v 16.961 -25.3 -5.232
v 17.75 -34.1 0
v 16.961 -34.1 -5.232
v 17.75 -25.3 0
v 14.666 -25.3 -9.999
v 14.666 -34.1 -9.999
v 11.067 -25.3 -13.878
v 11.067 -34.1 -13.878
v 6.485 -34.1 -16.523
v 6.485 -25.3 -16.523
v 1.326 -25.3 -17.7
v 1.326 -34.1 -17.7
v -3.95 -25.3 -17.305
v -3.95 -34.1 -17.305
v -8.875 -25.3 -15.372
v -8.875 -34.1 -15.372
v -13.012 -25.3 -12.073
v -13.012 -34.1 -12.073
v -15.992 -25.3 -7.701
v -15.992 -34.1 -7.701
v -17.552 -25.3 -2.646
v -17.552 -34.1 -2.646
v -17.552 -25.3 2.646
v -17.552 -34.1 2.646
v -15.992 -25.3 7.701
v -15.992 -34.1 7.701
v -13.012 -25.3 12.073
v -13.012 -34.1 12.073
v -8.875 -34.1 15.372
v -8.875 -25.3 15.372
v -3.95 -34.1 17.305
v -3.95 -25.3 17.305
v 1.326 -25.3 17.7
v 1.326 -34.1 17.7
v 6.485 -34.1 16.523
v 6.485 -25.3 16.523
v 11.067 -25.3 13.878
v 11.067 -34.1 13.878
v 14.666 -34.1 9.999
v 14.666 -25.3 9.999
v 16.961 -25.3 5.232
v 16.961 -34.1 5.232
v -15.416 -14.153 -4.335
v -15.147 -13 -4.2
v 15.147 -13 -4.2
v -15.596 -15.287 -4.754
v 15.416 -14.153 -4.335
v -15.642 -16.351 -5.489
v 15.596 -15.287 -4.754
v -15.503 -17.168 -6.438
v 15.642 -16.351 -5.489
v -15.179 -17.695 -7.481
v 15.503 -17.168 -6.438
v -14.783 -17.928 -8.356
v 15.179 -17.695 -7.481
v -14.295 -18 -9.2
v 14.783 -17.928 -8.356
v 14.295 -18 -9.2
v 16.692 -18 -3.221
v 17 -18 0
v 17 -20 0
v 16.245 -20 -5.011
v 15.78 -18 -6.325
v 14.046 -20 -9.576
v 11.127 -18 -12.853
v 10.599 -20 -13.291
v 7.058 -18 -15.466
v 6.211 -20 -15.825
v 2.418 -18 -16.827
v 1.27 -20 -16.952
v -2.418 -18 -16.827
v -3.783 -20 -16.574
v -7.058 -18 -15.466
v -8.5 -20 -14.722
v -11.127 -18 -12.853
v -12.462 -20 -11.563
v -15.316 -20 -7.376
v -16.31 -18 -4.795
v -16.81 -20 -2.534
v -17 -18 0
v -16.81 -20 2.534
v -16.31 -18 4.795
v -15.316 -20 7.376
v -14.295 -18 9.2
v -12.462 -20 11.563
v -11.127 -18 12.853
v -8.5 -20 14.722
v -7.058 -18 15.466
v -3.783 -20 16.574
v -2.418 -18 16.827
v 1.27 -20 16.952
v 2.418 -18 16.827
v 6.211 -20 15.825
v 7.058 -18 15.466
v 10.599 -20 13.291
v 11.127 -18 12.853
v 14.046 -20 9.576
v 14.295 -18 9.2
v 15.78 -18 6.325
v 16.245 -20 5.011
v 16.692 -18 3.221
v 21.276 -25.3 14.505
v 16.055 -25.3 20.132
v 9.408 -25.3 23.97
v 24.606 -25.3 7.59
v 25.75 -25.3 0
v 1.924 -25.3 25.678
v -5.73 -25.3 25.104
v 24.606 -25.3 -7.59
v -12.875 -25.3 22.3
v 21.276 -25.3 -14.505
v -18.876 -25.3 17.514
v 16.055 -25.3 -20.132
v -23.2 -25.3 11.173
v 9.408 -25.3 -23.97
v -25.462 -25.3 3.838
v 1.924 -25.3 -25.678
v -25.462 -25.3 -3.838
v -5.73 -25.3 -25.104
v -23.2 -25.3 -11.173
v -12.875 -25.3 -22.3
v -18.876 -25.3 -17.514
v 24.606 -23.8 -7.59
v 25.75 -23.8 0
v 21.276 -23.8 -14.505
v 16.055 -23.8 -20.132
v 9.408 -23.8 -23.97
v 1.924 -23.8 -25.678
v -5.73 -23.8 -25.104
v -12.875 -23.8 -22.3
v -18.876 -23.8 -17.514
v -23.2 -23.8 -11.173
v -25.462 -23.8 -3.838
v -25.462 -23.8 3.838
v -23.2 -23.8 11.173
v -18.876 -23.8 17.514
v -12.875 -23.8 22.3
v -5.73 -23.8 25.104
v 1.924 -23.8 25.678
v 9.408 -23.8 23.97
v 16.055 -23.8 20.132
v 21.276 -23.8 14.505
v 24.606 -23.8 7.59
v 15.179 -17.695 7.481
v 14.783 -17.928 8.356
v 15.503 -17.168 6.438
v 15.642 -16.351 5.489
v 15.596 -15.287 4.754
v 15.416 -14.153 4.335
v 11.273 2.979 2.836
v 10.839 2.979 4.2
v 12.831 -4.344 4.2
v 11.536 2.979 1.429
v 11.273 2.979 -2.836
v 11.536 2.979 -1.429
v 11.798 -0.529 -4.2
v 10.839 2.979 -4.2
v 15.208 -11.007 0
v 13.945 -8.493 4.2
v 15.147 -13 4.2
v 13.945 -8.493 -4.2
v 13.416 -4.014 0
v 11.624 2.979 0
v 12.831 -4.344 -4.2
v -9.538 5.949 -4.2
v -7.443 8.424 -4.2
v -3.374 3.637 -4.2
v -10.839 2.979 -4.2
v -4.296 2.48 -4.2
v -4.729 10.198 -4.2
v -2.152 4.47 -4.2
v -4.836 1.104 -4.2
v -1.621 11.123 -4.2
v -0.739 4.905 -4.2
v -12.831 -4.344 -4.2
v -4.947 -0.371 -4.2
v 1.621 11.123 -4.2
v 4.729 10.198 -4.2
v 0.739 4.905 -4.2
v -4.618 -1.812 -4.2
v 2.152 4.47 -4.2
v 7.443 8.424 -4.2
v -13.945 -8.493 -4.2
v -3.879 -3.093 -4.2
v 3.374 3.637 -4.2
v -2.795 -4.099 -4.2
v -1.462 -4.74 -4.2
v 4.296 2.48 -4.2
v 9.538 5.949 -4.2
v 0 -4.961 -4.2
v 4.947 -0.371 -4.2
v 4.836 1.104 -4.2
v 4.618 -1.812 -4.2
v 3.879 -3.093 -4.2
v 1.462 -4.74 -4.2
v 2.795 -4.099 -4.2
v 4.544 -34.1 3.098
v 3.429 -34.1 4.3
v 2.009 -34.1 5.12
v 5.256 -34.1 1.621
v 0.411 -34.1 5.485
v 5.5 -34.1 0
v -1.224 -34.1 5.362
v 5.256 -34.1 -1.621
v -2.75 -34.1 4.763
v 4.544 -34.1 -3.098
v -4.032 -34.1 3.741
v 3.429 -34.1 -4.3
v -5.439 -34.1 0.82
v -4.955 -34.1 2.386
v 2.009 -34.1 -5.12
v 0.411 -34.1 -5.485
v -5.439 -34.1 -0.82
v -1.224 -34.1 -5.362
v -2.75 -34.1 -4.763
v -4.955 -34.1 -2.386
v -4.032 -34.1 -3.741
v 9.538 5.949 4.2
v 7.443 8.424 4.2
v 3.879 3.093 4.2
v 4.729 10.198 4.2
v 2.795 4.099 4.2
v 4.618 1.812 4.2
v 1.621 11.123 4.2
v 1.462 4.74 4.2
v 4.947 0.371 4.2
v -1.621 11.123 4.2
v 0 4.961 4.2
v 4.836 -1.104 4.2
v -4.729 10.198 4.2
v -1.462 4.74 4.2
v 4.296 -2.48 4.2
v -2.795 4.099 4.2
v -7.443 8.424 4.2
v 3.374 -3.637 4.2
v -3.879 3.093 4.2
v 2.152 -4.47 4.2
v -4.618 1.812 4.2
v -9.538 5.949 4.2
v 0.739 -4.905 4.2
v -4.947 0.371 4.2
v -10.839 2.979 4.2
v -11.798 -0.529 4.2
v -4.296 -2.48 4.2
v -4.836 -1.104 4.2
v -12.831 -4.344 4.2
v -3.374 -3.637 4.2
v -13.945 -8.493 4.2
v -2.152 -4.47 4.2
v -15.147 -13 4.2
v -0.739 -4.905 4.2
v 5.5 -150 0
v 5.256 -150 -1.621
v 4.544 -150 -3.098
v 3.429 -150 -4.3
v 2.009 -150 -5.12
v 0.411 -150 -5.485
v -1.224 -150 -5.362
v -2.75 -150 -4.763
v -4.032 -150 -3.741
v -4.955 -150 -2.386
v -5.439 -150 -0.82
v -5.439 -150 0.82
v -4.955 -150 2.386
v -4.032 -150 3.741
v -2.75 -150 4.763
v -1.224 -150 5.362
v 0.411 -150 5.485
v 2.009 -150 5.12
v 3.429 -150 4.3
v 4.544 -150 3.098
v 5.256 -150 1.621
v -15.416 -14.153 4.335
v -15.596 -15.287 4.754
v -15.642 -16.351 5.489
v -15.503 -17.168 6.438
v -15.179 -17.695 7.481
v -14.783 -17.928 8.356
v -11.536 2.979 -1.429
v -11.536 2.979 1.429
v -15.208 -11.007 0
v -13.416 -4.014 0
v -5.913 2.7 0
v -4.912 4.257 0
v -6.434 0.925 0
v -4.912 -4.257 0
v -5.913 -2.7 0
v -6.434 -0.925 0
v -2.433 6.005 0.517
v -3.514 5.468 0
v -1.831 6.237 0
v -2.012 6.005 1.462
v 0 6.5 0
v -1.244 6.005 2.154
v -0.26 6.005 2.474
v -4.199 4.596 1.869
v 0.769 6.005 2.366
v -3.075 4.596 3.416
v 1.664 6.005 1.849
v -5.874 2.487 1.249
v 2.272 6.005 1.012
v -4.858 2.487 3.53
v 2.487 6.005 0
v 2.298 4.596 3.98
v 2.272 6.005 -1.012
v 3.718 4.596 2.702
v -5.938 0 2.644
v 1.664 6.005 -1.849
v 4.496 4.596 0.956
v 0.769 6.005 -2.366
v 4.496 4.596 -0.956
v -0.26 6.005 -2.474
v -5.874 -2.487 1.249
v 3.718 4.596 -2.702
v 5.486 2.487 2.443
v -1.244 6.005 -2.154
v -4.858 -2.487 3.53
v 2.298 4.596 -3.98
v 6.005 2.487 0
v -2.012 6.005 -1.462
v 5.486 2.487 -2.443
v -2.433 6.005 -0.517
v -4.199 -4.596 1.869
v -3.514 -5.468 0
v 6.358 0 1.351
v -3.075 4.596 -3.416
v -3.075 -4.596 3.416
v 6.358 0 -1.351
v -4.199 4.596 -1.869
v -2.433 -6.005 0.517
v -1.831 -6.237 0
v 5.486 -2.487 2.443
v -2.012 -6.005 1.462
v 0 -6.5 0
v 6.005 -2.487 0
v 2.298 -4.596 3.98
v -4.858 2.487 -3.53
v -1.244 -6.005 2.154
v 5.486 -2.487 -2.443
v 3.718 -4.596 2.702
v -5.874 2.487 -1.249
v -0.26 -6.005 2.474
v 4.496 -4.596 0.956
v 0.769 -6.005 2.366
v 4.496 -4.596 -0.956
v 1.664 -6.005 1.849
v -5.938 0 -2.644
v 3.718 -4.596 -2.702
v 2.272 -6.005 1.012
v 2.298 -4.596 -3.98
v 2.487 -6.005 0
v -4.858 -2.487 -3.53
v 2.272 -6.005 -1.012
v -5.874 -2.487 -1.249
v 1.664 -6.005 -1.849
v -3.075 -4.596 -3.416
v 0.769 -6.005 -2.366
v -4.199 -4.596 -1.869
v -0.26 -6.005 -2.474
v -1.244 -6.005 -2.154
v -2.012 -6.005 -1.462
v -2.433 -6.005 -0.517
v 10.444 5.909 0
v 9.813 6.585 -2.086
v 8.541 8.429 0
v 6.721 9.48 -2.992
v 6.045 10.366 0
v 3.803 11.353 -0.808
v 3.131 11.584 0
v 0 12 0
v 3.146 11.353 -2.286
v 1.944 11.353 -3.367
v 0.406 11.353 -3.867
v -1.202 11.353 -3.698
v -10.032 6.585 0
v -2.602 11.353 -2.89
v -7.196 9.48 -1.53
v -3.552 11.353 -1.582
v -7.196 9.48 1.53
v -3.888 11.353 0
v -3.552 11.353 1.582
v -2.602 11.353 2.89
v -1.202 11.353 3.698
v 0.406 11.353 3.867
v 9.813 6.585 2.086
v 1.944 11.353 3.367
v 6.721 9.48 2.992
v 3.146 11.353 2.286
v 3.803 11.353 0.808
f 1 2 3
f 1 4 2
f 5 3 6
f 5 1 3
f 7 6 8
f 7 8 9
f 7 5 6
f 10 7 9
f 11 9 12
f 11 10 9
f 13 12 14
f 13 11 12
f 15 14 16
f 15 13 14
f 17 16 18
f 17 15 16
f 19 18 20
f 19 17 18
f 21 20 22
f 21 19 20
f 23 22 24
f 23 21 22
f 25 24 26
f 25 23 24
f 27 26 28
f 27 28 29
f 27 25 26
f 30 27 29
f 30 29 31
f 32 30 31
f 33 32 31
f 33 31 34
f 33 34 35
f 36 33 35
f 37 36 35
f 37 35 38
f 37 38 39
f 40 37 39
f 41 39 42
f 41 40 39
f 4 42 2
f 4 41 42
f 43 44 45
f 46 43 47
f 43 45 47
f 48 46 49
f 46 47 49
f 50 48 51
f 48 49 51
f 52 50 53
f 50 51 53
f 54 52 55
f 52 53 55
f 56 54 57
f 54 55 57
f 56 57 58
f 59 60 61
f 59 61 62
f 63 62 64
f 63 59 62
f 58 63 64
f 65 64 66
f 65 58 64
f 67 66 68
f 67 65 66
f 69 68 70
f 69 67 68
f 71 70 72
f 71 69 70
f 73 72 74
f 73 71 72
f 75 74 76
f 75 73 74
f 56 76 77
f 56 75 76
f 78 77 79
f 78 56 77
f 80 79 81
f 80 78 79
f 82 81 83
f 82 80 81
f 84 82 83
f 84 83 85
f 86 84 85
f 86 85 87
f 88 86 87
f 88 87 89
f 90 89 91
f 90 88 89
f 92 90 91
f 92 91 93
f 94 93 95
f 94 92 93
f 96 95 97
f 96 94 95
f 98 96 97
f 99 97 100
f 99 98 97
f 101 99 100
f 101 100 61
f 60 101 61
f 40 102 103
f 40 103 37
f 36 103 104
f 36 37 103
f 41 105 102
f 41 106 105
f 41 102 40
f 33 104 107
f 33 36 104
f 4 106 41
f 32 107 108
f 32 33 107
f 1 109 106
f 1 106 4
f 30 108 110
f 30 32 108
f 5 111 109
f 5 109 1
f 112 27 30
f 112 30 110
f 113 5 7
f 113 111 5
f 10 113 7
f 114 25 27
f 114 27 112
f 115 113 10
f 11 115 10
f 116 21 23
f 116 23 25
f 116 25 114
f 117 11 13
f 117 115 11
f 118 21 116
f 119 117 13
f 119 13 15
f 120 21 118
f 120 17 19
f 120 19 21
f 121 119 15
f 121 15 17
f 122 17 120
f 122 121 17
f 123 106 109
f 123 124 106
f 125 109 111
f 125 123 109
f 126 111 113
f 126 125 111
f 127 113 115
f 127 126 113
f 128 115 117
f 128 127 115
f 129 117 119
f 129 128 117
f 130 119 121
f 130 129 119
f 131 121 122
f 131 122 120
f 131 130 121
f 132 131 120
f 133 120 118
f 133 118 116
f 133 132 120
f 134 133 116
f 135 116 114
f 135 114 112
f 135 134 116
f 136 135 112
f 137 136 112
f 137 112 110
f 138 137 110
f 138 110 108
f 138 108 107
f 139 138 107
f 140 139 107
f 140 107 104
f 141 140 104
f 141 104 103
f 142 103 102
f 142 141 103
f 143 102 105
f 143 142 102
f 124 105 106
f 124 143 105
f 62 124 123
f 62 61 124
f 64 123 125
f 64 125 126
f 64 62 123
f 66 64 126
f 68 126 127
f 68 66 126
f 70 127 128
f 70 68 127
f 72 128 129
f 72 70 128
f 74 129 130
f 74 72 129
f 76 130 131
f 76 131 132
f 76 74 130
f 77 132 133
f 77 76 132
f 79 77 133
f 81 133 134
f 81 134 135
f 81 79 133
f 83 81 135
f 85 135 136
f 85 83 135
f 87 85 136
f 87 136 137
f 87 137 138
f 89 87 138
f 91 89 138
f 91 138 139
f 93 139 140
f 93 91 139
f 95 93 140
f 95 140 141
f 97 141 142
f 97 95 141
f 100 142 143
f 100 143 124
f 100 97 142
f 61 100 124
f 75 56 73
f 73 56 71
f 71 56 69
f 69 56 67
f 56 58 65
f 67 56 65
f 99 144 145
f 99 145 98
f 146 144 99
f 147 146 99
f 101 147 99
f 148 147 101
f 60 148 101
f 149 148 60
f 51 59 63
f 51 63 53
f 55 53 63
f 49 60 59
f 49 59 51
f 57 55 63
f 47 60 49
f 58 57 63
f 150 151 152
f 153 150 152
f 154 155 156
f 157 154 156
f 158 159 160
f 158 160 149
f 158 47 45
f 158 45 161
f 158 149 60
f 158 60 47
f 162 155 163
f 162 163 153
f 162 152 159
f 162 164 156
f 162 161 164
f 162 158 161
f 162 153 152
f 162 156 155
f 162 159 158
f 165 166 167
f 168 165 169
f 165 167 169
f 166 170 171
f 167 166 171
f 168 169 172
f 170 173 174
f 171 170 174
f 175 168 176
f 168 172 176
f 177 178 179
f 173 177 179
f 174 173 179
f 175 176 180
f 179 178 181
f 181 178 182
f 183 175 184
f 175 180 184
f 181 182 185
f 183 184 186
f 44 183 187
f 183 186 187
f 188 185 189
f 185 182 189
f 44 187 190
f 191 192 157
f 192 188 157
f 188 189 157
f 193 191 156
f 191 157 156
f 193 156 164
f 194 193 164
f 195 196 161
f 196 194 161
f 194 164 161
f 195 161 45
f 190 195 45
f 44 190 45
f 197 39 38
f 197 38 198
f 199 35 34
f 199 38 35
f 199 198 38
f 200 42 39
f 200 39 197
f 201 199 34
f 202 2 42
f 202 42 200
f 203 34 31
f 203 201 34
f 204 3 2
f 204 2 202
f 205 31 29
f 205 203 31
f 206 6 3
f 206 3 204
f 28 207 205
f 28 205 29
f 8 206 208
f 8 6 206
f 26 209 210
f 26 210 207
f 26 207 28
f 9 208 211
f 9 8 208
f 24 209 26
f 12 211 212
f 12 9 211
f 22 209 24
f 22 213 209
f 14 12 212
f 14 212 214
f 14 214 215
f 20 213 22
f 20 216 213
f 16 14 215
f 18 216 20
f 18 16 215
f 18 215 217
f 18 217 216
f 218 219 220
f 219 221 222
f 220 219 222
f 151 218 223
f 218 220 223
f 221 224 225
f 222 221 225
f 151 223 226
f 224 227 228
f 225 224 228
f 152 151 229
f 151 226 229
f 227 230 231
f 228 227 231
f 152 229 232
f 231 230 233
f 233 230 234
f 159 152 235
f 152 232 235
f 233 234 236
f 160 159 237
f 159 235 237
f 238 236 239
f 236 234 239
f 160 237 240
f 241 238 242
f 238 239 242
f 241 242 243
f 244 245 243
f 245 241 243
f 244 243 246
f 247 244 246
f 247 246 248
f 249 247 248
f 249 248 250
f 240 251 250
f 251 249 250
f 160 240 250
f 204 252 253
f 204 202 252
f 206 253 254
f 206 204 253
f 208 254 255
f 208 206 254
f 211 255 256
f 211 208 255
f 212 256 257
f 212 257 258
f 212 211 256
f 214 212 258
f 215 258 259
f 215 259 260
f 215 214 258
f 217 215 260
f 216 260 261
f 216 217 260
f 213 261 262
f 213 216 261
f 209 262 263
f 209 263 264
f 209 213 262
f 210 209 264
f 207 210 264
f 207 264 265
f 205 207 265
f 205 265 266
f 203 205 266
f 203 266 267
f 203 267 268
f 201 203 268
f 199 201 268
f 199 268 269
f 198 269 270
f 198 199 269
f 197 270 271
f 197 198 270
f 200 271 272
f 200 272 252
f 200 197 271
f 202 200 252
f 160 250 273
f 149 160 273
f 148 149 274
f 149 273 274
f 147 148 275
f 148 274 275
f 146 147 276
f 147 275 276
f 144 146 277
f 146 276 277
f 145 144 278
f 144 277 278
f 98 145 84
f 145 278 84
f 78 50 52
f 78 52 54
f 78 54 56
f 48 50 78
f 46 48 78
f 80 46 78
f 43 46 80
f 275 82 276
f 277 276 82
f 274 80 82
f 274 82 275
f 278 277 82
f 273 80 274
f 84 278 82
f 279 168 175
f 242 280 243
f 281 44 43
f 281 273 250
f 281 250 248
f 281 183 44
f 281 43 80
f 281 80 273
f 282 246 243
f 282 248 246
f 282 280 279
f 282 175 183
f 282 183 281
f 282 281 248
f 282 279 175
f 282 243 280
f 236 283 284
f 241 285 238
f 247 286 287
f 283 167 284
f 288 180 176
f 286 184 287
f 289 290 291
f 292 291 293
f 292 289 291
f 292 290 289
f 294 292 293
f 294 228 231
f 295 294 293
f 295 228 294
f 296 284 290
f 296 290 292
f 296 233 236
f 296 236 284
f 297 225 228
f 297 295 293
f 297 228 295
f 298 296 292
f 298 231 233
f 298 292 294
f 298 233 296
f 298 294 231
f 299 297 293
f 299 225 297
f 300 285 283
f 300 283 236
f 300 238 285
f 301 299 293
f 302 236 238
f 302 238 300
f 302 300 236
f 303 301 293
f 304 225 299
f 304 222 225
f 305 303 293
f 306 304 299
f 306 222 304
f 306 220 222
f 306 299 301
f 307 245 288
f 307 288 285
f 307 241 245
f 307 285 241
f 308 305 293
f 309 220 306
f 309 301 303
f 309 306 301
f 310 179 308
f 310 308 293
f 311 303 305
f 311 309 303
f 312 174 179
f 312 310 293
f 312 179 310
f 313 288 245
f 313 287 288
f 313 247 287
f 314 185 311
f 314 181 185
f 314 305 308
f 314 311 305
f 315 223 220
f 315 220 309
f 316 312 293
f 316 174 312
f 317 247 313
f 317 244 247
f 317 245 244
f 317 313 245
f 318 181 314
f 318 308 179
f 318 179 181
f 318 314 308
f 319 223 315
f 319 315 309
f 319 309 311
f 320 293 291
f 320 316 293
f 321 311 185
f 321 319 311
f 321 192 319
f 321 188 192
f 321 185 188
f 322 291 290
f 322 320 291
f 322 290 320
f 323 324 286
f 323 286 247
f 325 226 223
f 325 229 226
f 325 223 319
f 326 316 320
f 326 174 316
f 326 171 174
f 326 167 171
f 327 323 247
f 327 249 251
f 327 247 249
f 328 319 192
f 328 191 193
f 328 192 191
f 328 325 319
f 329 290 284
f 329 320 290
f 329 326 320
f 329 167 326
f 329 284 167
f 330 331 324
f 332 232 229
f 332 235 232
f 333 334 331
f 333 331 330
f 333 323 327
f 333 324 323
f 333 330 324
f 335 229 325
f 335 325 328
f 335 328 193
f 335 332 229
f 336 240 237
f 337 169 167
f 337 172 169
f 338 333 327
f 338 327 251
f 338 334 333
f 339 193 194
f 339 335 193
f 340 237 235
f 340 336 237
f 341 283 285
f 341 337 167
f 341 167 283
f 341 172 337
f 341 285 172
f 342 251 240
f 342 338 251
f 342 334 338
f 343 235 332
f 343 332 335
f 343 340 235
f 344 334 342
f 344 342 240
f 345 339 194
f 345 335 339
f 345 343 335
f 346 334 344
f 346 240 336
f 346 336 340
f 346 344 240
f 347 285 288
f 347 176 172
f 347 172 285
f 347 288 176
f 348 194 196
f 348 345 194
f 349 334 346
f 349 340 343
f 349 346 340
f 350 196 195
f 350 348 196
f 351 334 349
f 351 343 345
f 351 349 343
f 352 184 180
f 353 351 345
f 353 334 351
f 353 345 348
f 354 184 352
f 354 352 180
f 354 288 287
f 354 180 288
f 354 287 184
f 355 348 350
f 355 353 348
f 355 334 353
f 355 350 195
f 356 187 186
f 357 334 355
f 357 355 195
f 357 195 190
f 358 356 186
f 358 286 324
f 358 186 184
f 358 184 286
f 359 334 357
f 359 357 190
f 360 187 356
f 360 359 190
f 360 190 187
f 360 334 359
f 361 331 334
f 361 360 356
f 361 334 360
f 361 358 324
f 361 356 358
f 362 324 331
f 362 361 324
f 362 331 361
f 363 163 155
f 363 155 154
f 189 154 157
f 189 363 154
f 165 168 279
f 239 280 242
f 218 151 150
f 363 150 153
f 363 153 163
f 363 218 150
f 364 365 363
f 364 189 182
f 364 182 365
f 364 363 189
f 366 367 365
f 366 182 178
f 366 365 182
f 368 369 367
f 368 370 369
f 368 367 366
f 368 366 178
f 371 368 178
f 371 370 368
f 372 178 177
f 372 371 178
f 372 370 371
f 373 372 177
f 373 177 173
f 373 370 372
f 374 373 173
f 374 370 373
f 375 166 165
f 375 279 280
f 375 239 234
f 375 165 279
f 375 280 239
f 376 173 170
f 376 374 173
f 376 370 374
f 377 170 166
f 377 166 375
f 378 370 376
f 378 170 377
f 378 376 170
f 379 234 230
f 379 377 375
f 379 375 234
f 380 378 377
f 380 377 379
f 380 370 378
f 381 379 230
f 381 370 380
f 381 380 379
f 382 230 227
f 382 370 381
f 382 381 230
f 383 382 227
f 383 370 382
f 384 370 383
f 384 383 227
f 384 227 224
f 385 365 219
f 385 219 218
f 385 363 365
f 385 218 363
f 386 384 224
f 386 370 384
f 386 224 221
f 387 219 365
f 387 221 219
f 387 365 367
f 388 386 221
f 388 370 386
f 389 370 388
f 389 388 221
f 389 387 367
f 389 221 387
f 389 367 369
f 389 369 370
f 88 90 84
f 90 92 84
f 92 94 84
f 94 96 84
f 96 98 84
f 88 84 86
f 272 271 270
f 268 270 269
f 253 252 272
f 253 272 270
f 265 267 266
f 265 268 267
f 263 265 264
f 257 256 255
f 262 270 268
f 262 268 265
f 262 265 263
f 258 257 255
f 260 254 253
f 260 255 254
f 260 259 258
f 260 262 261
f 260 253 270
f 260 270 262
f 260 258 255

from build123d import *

# Parameters (mm, degrees)
CUT_EXTRUDE1_DEPTH = 25


with BuildPart() as part:
    # Sketch1 → Revolve1 (revolve)
    with BuildSketch(Plane.XY, mode=Mode.PRIVATE) as revolve1_sk:
        with BuildLine():
            Line((0, -150), (-5.5, -150))
            Line((-5.5, -150), (-5.5, -34.1))
            Line((-5.5, -34.1), (-17.75, -34.1))
            Line((-17.75, -34.1), (-17.75, -25.3))
            Line((-17.75, -25.3), (-25.75, -25.3))
            Line((-25.75, -25.3), (-25.75, -23.8))
            Line((-25.75, -23.8), (-17, -20))
            Line((-17, -20), (-17, -18))
            Line((-17, -18), (-11.624443868, 2.97864143))
            ThreePointArc((-11.624443868, 2.97864143), (-7.357183661, 9.480076402), (0, 12))
            Line((0, 12), (0, -150))
        make_face()
    revolve(revolve1_sk.sketch.rotate(Axis((0, -150, 0), (0, 1, 0)), 180), axis=Axis((0, -150, 0), (0, 1, 0)))

    # Sketch2 → Cut-Extrude1 (cut, symmetric)
    with BuildSketch(Plane(origin=(0, 0, 0), x_dir=(0, 0, -1), z_dir=(1, 0, 0))):
        with BuildLine():
            Line((-4.2, 12.434179723), (-4.2, -13))
            ThreePointArc((-4.2, -13), (-5.664466094, -16.535533906), (-9.2, -18))
            Line((-9.2, -18), (-21.107877624, -18))
            Line((-21.107877624, -18), (-21.107877624, 12.434179723))
            Line((-21.107877624, 12.434179723), (-4.2, 12.434179723))
        make_face()
        with BuildLine():
            Line((21.107877624, 12.434179723), (4.2, 12.434179723))
            Line((4.2, 12.434179723), (4.2, -13))
            ThreePointArc((4.2, -13), (5.664466094, -16.535533906), (9.2, -18))
            Line((9.2, -18), (21.107877624, -18))
            Line((21.107877624, -18), (21.107877624, 12.434179723))
        make_face()
    extrude(amount=CUT_EXTRUDE1_DEPTH, both=True, mode=Mode.SUBTRACT)

    # Sketch3 → Cut-Revolve1 (revolve, cut)
    with BuildSketch(Plane.XY):
        with BuildLine():
            Line((0, -6.5), (0, 6.5))
            ThreePointArc((0, 6.5), (-6.5, 0), (0, -6.5))
        make_face()
    revolve(axis=Axis((0, -6.5, 0), (0, 1, 0)), mode=Mode.SUBTRACT)


solid = part.part
